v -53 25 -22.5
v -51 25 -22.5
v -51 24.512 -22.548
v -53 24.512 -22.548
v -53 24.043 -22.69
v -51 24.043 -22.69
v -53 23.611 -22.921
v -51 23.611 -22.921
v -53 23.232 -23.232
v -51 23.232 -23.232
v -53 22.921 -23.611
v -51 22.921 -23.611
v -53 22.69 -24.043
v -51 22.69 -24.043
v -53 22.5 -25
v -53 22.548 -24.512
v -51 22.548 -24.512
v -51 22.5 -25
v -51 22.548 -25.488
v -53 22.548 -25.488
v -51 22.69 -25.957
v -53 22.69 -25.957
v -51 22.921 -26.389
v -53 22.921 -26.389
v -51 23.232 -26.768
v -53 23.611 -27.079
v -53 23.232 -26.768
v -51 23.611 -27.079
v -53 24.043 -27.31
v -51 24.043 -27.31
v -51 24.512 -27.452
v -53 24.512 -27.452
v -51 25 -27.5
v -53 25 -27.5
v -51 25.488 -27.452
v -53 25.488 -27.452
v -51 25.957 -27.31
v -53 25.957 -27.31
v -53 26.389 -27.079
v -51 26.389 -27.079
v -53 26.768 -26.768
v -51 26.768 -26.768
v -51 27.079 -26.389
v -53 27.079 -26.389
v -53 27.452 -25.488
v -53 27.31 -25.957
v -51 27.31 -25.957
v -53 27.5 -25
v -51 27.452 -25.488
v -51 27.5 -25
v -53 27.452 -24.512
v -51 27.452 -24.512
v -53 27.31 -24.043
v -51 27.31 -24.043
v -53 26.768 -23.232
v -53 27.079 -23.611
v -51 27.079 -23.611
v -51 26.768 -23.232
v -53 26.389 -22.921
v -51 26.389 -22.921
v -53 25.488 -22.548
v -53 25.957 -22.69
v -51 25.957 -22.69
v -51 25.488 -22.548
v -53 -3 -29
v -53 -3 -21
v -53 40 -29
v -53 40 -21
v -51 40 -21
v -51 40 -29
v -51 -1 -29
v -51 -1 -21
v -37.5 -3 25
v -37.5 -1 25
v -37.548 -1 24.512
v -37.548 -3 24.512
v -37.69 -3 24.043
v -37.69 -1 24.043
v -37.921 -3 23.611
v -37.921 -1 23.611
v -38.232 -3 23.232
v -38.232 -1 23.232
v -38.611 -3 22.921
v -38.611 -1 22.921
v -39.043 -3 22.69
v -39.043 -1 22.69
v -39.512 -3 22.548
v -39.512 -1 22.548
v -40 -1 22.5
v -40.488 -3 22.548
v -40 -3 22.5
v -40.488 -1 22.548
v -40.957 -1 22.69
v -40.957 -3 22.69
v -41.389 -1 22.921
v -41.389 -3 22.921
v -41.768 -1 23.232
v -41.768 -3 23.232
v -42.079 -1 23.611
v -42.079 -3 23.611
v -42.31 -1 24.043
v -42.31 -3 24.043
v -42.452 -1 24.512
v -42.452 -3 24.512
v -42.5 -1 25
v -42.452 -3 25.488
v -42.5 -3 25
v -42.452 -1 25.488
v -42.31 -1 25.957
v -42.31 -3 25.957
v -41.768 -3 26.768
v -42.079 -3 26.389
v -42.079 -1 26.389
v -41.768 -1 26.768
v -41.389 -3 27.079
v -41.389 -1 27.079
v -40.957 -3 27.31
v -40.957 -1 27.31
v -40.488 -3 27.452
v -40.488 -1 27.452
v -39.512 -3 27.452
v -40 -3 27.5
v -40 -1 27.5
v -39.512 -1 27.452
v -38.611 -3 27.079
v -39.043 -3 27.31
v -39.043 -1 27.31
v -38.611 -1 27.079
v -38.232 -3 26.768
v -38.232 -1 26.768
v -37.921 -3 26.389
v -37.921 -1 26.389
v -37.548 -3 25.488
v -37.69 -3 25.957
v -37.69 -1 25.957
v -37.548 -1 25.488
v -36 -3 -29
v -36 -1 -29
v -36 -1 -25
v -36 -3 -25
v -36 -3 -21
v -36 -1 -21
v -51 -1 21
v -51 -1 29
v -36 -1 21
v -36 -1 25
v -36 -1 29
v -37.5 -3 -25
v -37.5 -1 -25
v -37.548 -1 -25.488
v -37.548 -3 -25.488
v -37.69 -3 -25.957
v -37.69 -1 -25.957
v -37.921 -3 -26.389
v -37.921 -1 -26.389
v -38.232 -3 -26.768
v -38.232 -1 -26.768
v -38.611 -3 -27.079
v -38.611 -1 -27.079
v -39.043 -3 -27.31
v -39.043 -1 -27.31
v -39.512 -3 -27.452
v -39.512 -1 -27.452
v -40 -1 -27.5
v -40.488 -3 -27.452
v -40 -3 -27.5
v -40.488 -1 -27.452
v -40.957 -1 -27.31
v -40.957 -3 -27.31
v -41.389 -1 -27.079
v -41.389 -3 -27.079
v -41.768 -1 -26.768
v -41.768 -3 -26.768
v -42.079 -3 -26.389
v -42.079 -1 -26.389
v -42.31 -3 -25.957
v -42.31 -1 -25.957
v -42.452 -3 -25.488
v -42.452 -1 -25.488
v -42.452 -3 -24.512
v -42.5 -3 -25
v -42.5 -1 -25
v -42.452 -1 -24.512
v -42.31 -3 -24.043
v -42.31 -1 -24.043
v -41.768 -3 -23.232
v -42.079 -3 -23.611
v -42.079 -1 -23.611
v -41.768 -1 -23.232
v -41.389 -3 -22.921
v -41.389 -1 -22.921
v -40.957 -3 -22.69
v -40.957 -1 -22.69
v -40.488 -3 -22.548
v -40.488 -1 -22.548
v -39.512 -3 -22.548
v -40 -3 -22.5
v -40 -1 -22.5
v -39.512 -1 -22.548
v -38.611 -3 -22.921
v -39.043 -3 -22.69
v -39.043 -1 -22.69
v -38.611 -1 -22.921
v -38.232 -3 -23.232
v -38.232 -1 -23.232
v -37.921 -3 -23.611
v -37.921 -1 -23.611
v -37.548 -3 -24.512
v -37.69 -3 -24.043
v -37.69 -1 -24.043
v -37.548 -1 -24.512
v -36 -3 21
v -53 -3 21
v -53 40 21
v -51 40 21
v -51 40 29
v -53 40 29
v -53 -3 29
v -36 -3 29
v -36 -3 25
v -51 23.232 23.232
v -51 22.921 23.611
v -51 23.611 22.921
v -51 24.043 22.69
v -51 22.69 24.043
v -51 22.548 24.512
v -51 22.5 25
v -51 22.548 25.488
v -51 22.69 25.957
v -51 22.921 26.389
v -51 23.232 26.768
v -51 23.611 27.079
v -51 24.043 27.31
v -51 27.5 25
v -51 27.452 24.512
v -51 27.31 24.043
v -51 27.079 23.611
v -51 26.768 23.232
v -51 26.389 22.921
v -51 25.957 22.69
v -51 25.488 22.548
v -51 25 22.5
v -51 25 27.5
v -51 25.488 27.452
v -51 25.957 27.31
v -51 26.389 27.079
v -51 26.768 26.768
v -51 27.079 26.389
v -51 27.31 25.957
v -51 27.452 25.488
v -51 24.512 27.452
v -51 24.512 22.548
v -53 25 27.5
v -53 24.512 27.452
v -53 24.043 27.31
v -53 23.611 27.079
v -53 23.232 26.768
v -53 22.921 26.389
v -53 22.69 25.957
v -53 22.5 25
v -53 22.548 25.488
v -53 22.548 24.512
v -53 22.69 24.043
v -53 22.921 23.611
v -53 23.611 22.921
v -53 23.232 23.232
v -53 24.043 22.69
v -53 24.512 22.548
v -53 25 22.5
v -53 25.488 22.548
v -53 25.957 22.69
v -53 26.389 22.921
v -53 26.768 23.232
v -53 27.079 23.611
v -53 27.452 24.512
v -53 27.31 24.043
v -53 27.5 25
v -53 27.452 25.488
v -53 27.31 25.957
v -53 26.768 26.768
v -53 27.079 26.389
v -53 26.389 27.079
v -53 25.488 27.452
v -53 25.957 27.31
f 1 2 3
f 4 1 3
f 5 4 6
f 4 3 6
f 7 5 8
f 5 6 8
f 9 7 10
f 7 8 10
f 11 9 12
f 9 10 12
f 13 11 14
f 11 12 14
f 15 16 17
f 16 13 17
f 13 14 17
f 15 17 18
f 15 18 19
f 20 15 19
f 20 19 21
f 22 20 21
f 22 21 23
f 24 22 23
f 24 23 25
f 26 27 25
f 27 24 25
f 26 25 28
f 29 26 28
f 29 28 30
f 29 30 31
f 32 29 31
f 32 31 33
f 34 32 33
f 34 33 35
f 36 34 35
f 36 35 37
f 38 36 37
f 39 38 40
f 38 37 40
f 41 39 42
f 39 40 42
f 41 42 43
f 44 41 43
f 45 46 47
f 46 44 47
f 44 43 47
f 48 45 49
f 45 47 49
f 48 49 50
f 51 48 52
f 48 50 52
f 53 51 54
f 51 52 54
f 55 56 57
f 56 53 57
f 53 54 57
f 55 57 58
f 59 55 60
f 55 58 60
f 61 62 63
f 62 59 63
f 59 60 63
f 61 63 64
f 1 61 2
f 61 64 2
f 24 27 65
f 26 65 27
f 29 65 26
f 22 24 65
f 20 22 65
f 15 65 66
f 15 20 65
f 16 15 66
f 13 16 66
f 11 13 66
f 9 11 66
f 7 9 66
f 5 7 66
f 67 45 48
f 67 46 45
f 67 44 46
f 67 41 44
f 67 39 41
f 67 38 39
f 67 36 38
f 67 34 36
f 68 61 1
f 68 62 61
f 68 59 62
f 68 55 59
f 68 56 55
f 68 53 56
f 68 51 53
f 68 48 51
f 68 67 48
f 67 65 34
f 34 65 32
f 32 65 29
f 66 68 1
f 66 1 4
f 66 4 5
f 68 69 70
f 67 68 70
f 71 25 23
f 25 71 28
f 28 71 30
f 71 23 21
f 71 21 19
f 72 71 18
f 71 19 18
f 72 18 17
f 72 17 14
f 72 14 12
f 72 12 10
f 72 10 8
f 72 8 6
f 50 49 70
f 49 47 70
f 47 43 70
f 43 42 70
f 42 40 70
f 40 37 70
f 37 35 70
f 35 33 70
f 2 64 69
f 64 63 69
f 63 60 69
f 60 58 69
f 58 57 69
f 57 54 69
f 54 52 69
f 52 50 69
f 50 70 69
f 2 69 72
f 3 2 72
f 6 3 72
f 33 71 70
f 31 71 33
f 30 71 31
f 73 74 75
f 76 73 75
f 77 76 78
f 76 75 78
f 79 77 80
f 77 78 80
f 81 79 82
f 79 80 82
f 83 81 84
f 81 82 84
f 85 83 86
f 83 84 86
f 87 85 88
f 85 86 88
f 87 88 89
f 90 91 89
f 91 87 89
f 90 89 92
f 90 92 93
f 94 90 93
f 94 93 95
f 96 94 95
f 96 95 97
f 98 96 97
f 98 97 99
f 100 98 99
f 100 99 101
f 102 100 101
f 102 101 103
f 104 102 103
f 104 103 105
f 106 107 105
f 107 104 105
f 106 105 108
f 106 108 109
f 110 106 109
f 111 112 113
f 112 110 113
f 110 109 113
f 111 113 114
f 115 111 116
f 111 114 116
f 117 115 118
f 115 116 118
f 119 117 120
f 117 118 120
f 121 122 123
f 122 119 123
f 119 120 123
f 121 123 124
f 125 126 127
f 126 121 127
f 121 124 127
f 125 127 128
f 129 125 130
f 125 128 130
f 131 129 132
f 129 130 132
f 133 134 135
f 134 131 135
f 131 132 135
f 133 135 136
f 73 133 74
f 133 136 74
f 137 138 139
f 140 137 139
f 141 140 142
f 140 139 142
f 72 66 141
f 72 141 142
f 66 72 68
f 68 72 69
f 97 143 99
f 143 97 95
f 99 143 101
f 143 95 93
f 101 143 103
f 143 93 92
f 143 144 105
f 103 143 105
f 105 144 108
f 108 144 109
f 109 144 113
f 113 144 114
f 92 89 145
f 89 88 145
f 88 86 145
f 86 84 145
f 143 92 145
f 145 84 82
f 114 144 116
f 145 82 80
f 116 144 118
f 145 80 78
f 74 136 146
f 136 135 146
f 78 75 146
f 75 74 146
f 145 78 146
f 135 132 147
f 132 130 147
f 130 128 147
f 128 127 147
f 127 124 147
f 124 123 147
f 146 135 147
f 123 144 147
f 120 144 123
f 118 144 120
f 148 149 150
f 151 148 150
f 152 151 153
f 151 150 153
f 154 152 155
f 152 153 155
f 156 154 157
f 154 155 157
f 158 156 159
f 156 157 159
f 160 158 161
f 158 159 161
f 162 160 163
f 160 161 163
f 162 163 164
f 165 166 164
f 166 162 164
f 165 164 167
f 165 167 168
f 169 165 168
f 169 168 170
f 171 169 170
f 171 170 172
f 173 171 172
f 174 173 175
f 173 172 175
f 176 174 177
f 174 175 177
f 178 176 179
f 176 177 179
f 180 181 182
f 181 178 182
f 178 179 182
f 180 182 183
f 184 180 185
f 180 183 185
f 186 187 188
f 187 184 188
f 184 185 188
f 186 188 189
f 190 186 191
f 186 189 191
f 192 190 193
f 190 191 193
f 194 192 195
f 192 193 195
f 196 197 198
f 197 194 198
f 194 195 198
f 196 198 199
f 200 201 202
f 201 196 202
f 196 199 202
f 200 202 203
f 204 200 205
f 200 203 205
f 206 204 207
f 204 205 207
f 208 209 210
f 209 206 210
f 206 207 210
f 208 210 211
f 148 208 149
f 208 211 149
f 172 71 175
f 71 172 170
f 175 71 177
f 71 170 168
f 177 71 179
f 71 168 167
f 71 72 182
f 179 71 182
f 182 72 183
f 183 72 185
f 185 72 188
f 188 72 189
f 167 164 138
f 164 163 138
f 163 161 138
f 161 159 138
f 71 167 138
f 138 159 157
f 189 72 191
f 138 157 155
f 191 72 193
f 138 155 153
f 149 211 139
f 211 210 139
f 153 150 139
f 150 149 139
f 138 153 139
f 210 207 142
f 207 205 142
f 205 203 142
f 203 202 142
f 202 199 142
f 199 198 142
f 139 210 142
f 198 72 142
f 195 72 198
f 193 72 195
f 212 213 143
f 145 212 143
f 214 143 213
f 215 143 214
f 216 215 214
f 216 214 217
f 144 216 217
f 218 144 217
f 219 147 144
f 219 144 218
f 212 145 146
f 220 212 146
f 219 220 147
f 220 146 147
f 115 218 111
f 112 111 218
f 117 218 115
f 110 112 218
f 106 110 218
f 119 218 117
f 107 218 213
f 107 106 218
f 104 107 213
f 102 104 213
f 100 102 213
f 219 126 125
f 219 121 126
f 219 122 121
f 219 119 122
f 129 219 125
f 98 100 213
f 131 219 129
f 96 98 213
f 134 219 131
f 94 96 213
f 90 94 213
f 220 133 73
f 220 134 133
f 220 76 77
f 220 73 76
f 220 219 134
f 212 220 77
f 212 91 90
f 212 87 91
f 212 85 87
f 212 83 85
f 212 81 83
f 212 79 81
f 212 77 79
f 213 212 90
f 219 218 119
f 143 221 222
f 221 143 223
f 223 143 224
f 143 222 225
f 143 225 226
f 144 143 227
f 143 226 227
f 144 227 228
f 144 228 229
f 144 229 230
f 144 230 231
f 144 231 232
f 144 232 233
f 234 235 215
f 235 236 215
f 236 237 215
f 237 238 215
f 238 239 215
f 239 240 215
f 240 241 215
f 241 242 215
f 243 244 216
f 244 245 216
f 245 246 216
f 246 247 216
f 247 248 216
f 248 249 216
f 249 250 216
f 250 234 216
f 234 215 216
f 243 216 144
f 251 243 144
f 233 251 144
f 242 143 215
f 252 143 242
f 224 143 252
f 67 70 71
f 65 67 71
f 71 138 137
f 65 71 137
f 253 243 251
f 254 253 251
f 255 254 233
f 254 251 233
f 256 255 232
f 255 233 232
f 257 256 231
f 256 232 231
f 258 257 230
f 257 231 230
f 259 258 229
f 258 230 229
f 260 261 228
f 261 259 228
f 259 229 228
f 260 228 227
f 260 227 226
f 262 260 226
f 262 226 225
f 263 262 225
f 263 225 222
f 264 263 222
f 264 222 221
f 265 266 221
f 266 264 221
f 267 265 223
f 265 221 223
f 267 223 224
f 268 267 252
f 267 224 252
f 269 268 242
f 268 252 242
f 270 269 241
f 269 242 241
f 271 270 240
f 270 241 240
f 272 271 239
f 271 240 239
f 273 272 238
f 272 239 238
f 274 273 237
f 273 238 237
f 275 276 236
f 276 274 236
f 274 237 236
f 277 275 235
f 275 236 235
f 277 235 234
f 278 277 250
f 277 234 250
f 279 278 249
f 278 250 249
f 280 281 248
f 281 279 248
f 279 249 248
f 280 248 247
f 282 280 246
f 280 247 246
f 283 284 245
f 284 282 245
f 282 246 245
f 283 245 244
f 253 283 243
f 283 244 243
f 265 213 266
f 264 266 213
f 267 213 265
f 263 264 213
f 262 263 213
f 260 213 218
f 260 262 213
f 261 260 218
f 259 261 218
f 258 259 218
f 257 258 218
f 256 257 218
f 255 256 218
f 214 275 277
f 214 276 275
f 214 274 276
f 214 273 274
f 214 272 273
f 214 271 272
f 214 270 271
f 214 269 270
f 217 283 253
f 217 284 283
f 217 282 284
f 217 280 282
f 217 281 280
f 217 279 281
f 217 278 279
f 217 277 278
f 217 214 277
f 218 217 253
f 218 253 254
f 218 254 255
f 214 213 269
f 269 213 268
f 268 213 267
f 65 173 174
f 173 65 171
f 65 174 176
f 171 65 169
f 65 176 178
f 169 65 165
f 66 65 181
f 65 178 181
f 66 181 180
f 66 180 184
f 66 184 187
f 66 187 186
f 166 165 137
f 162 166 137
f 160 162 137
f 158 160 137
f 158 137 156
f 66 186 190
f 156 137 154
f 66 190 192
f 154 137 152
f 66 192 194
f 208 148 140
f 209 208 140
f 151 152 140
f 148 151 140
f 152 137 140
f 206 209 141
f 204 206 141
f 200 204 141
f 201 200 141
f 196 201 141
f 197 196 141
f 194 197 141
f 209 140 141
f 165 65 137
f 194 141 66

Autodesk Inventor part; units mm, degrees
ref_plane "YZ Plane" through (0, 0, 0) normal (1, 0, 0) x (0, 1, 0)
ref_plane "Plano de trabalho3" through (-51, -1, -36) normal (-1, 0, 0) x (0, 0, 1)
sketch "Esboço7" plane through (-51, -1, -36) normal (-1, 0, 0) x (0, 0, 1)
  circle A0 centre (61, 26) radius 2.5 projected
  line L0 (58.5, 41) -> (57, 41)
  line L1 (57, 41) -> (65, 41)
  line L2 (65, 41) -> (65, -2)
  line L3 (65, -2) -> (57, -2)
  line L4 (57, -2) -> (57, 41)
  line L5 (36, 36) -> (36, -3.986)
  circle A1 centre (11, 26) radius 2.5
  line L6 (15, 41) -> (7, 41)
  line L7 (7, 41) -> (7, -2)
  line L8 (7, -2) -> (15, -2)
  line L9 (15, -2) -> (15, 41)
  circle A2 centre (61, 26) radius 2.5
  point P0 (36, 1)
  dimension "d84" = 1.5
  dimension "d85" = 8
  dimension "d86" = 43
  dimension "d114" = 42
  dimension "d118" = 50
extrude "Extrusão7" add sketch "Esboço7" along normal blind 2
ref_plane "Plano de trabalho6" through (0, -1, 0) normal (0, -1, 0) x (1, 0, 0)
sketch "Esboço8" plane through (0, -1, 0) normal (0, -1, 0) x (1, 0, 0)
  line L0 (-51, -29) -> (-36, -29)
  line L1 (-36, -29) -> (-36, -21)
  line L2 (-36, -21) -> (-51, -21)
  line L3 (-51, -21) -> (-51, -29)
  circle A0 centre (-40, 25) radius 2.5
  circle A1 centre (-40, -25) radius 2.5
  line L4 (-36, -25) -> (-40, -25)
  line L5 (-51, -21) -> (-51, -29) projected
  line L6 (-36, -21) -> (-51, -21)
  line L7 (-51, -21) -> (-51, -29)
  line L8 (-36, -24.068) -> (-36, -21)
  line L9 (-36, -21) -> (-51, -21)
  line L10 (-51, -21) -> (-51, -29)
  line L11 (-51, -29) -> (-36, -29)
  line L12 (-36, -29) -> (-36, -21)
  line L13 (-51, 21) -> (-53, 21) projected
  line L14 (-51, 21) -> (-26, 21)
  line L15 (-26, 21) -> (-26, 29)
  line L16 (-36.8, 29) -> (-61.8, 29)
  line L17 (-51, 29) -> (-51, 21)
  line L18 (-36, 21) -> (-36, 29)
  line L19 (-36, 25) -> (-40, 25)
  line L20 (-36, 29) -> (-51, 29)
  line L21 (-51, 29) -> (-51, 21)
  line L22 (-51, 21) -> (-36, 21)
  line L23 (-36, 21) -> (-36, 29)
  point P0 (0, 0)
  dimension "d90" = 15
  dimension "d116" = 4
  dimension "d119" = 8
  dimension "d120" = 4
extrude "Extrusão8" add sketch "Esboço8" along normal blind 2
properties part number "Fixação Caixa de Segurança"
